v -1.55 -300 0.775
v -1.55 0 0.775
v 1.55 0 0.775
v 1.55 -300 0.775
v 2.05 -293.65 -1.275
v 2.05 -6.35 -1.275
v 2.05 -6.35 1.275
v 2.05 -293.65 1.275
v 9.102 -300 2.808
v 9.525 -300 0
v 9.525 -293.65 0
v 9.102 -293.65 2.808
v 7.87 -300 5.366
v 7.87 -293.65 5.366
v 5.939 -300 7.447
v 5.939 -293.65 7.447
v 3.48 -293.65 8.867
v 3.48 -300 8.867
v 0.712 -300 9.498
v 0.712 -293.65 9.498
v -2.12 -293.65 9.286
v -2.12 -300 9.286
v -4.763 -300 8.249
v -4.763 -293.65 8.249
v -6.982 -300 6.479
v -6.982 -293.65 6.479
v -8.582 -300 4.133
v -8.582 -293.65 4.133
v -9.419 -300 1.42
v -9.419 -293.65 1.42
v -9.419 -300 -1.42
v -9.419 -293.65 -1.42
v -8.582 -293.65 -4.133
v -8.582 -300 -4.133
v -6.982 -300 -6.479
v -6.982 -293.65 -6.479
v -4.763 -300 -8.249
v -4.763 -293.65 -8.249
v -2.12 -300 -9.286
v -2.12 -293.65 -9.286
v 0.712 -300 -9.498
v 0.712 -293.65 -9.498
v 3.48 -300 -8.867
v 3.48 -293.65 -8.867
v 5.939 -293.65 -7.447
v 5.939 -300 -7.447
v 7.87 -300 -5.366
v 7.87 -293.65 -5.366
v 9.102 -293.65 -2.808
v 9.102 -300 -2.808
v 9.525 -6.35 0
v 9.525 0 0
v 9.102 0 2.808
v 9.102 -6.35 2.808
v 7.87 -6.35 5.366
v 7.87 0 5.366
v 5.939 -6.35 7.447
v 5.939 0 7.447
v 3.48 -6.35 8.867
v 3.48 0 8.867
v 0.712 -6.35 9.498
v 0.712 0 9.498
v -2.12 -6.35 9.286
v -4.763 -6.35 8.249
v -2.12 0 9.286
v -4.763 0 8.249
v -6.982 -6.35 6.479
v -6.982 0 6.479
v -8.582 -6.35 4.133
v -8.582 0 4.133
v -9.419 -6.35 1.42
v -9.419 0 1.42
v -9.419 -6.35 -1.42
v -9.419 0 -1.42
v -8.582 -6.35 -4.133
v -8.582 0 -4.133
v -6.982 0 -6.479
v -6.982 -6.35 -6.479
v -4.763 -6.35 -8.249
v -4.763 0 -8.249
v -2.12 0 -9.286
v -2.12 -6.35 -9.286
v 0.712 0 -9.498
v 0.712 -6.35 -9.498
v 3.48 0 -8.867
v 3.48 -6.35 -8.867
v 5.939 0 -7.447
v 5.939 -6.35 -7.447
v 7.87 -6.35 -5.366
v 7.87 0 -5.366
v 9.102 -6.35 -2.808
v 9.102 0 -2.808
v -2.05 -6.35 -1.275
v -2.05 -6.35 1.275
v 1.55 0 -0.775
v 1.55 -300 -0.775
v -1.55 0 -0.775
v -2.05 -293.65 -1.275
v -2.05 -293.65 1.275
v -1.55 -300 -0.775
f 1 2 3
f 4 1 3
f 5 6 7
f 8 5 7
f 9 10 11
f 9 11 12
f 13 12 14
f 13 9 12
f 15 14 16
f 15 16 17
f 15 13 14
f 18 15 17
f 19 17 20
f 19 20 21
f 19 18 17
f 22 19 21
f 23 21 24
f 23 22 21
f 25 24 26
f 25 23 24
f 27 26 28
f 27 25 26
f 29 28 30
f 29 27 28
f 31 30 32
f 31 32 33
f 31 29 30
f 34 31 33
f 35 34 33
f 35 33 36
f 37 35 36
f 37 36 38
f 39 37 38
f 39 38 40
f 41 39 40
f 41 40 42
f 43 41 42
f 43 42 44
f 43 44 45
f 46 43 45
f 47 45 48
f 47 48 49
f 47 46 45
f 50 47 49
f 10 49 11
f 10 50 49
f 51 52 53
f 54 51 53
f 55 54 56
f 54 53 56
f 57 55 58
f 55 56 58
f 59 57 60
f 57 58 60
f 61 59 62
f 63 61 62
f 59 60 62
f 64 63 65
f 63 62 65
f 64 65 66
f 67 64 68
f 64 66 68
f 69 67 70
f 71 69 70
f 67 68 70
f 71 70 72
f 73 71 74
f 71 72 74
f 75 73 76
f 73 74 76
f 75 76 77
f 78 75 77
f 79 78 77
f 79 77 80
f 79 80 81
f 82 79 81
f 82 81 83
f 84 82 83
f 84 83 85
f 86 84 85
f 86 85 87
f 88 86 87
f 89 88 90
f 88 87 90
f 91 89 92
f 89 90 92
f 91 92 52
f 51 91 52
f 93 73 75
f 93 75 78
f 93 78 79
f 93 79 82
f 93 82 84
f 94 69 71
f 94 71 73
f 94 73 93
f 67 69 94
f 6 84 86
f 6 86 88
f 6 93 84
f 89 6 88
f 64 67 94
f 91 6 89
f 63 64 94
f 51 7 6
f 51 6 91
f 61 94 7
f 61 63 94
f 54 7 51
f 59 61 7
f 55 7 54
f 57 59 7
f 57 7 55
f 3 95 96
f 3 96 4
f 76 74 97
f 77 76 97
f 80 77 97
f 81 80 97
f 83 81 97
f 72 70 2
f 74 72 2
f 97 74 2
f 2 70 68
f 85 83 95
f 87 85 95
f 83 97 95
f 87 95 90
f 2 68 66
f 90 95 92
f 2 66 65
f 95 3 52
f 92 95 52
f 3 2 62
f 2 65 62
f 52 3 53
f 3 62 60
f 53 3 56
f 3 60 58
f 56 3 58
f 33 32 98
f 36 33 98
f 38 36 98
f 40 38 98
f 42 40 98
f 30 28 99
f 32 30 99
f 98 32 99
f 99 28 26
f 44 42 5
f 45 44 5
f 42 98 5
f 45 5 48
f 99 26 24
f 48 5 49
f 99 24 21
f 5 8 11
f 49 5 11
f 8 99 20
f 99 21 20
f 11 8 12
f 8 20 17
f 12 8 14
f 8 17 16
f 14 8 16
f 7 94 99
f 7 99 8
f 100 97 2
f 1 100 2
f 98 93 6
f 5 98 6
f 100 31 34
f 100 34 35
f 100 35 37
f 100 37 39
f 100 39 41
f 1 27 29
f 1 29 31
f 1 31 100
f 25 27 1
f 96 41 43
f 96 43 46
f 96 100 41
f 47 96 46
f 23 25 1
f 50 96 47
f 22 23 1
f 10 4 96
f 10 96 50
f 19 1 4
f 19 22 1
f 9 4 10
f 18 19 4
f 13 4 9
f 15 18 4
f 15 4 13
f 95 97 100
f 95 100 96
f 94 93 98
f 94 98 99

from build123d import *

# Parameters (mm, degrees)
F0_W     = 4.1
F0_H     = 2.55
F0_W_2   = 3.1
F0_H_2   = 1.55
F3_DEPTH = 300
F4_R     = 9.525
F4_W     = 4.1
F4_H     = 2.55
F5_DEPTH = 6.35
F6_R     = 9.525
F6_W     = 4.1
F6_H     = 2.55
F7_DEPTH = 6.35


with BuildPart() as f3:
    # F0 (on Front) → F3 (new body)
    with BuildSketch(Plane.XZ):
        Rectangle(F0_W, F0_H)
        Rectangle(F0_W_2, F0_H_2, mode=Mode.SUBTRACT)
    extrude(amount=F3_DEPTH)

    # F4 (on face) → F5 (join)
    with BuildSketch(Plane.XZ.offset(300)):
        Circle(F4_R)
        Rectangle(F4_W, F4_H, mode=Mode.SUBTRACT)
    extrude(amount=-F5_DEPTH)

    # F6 (on face) → F7 (join)
    with BuildSketch(Plane.XZ):
        Circle(F6_R)
        Rectangle(F6_W, F6_H, mode=Mode.SUBTRACT)
    extrude(amount=F7_DEPTH)


solid = f3.part
